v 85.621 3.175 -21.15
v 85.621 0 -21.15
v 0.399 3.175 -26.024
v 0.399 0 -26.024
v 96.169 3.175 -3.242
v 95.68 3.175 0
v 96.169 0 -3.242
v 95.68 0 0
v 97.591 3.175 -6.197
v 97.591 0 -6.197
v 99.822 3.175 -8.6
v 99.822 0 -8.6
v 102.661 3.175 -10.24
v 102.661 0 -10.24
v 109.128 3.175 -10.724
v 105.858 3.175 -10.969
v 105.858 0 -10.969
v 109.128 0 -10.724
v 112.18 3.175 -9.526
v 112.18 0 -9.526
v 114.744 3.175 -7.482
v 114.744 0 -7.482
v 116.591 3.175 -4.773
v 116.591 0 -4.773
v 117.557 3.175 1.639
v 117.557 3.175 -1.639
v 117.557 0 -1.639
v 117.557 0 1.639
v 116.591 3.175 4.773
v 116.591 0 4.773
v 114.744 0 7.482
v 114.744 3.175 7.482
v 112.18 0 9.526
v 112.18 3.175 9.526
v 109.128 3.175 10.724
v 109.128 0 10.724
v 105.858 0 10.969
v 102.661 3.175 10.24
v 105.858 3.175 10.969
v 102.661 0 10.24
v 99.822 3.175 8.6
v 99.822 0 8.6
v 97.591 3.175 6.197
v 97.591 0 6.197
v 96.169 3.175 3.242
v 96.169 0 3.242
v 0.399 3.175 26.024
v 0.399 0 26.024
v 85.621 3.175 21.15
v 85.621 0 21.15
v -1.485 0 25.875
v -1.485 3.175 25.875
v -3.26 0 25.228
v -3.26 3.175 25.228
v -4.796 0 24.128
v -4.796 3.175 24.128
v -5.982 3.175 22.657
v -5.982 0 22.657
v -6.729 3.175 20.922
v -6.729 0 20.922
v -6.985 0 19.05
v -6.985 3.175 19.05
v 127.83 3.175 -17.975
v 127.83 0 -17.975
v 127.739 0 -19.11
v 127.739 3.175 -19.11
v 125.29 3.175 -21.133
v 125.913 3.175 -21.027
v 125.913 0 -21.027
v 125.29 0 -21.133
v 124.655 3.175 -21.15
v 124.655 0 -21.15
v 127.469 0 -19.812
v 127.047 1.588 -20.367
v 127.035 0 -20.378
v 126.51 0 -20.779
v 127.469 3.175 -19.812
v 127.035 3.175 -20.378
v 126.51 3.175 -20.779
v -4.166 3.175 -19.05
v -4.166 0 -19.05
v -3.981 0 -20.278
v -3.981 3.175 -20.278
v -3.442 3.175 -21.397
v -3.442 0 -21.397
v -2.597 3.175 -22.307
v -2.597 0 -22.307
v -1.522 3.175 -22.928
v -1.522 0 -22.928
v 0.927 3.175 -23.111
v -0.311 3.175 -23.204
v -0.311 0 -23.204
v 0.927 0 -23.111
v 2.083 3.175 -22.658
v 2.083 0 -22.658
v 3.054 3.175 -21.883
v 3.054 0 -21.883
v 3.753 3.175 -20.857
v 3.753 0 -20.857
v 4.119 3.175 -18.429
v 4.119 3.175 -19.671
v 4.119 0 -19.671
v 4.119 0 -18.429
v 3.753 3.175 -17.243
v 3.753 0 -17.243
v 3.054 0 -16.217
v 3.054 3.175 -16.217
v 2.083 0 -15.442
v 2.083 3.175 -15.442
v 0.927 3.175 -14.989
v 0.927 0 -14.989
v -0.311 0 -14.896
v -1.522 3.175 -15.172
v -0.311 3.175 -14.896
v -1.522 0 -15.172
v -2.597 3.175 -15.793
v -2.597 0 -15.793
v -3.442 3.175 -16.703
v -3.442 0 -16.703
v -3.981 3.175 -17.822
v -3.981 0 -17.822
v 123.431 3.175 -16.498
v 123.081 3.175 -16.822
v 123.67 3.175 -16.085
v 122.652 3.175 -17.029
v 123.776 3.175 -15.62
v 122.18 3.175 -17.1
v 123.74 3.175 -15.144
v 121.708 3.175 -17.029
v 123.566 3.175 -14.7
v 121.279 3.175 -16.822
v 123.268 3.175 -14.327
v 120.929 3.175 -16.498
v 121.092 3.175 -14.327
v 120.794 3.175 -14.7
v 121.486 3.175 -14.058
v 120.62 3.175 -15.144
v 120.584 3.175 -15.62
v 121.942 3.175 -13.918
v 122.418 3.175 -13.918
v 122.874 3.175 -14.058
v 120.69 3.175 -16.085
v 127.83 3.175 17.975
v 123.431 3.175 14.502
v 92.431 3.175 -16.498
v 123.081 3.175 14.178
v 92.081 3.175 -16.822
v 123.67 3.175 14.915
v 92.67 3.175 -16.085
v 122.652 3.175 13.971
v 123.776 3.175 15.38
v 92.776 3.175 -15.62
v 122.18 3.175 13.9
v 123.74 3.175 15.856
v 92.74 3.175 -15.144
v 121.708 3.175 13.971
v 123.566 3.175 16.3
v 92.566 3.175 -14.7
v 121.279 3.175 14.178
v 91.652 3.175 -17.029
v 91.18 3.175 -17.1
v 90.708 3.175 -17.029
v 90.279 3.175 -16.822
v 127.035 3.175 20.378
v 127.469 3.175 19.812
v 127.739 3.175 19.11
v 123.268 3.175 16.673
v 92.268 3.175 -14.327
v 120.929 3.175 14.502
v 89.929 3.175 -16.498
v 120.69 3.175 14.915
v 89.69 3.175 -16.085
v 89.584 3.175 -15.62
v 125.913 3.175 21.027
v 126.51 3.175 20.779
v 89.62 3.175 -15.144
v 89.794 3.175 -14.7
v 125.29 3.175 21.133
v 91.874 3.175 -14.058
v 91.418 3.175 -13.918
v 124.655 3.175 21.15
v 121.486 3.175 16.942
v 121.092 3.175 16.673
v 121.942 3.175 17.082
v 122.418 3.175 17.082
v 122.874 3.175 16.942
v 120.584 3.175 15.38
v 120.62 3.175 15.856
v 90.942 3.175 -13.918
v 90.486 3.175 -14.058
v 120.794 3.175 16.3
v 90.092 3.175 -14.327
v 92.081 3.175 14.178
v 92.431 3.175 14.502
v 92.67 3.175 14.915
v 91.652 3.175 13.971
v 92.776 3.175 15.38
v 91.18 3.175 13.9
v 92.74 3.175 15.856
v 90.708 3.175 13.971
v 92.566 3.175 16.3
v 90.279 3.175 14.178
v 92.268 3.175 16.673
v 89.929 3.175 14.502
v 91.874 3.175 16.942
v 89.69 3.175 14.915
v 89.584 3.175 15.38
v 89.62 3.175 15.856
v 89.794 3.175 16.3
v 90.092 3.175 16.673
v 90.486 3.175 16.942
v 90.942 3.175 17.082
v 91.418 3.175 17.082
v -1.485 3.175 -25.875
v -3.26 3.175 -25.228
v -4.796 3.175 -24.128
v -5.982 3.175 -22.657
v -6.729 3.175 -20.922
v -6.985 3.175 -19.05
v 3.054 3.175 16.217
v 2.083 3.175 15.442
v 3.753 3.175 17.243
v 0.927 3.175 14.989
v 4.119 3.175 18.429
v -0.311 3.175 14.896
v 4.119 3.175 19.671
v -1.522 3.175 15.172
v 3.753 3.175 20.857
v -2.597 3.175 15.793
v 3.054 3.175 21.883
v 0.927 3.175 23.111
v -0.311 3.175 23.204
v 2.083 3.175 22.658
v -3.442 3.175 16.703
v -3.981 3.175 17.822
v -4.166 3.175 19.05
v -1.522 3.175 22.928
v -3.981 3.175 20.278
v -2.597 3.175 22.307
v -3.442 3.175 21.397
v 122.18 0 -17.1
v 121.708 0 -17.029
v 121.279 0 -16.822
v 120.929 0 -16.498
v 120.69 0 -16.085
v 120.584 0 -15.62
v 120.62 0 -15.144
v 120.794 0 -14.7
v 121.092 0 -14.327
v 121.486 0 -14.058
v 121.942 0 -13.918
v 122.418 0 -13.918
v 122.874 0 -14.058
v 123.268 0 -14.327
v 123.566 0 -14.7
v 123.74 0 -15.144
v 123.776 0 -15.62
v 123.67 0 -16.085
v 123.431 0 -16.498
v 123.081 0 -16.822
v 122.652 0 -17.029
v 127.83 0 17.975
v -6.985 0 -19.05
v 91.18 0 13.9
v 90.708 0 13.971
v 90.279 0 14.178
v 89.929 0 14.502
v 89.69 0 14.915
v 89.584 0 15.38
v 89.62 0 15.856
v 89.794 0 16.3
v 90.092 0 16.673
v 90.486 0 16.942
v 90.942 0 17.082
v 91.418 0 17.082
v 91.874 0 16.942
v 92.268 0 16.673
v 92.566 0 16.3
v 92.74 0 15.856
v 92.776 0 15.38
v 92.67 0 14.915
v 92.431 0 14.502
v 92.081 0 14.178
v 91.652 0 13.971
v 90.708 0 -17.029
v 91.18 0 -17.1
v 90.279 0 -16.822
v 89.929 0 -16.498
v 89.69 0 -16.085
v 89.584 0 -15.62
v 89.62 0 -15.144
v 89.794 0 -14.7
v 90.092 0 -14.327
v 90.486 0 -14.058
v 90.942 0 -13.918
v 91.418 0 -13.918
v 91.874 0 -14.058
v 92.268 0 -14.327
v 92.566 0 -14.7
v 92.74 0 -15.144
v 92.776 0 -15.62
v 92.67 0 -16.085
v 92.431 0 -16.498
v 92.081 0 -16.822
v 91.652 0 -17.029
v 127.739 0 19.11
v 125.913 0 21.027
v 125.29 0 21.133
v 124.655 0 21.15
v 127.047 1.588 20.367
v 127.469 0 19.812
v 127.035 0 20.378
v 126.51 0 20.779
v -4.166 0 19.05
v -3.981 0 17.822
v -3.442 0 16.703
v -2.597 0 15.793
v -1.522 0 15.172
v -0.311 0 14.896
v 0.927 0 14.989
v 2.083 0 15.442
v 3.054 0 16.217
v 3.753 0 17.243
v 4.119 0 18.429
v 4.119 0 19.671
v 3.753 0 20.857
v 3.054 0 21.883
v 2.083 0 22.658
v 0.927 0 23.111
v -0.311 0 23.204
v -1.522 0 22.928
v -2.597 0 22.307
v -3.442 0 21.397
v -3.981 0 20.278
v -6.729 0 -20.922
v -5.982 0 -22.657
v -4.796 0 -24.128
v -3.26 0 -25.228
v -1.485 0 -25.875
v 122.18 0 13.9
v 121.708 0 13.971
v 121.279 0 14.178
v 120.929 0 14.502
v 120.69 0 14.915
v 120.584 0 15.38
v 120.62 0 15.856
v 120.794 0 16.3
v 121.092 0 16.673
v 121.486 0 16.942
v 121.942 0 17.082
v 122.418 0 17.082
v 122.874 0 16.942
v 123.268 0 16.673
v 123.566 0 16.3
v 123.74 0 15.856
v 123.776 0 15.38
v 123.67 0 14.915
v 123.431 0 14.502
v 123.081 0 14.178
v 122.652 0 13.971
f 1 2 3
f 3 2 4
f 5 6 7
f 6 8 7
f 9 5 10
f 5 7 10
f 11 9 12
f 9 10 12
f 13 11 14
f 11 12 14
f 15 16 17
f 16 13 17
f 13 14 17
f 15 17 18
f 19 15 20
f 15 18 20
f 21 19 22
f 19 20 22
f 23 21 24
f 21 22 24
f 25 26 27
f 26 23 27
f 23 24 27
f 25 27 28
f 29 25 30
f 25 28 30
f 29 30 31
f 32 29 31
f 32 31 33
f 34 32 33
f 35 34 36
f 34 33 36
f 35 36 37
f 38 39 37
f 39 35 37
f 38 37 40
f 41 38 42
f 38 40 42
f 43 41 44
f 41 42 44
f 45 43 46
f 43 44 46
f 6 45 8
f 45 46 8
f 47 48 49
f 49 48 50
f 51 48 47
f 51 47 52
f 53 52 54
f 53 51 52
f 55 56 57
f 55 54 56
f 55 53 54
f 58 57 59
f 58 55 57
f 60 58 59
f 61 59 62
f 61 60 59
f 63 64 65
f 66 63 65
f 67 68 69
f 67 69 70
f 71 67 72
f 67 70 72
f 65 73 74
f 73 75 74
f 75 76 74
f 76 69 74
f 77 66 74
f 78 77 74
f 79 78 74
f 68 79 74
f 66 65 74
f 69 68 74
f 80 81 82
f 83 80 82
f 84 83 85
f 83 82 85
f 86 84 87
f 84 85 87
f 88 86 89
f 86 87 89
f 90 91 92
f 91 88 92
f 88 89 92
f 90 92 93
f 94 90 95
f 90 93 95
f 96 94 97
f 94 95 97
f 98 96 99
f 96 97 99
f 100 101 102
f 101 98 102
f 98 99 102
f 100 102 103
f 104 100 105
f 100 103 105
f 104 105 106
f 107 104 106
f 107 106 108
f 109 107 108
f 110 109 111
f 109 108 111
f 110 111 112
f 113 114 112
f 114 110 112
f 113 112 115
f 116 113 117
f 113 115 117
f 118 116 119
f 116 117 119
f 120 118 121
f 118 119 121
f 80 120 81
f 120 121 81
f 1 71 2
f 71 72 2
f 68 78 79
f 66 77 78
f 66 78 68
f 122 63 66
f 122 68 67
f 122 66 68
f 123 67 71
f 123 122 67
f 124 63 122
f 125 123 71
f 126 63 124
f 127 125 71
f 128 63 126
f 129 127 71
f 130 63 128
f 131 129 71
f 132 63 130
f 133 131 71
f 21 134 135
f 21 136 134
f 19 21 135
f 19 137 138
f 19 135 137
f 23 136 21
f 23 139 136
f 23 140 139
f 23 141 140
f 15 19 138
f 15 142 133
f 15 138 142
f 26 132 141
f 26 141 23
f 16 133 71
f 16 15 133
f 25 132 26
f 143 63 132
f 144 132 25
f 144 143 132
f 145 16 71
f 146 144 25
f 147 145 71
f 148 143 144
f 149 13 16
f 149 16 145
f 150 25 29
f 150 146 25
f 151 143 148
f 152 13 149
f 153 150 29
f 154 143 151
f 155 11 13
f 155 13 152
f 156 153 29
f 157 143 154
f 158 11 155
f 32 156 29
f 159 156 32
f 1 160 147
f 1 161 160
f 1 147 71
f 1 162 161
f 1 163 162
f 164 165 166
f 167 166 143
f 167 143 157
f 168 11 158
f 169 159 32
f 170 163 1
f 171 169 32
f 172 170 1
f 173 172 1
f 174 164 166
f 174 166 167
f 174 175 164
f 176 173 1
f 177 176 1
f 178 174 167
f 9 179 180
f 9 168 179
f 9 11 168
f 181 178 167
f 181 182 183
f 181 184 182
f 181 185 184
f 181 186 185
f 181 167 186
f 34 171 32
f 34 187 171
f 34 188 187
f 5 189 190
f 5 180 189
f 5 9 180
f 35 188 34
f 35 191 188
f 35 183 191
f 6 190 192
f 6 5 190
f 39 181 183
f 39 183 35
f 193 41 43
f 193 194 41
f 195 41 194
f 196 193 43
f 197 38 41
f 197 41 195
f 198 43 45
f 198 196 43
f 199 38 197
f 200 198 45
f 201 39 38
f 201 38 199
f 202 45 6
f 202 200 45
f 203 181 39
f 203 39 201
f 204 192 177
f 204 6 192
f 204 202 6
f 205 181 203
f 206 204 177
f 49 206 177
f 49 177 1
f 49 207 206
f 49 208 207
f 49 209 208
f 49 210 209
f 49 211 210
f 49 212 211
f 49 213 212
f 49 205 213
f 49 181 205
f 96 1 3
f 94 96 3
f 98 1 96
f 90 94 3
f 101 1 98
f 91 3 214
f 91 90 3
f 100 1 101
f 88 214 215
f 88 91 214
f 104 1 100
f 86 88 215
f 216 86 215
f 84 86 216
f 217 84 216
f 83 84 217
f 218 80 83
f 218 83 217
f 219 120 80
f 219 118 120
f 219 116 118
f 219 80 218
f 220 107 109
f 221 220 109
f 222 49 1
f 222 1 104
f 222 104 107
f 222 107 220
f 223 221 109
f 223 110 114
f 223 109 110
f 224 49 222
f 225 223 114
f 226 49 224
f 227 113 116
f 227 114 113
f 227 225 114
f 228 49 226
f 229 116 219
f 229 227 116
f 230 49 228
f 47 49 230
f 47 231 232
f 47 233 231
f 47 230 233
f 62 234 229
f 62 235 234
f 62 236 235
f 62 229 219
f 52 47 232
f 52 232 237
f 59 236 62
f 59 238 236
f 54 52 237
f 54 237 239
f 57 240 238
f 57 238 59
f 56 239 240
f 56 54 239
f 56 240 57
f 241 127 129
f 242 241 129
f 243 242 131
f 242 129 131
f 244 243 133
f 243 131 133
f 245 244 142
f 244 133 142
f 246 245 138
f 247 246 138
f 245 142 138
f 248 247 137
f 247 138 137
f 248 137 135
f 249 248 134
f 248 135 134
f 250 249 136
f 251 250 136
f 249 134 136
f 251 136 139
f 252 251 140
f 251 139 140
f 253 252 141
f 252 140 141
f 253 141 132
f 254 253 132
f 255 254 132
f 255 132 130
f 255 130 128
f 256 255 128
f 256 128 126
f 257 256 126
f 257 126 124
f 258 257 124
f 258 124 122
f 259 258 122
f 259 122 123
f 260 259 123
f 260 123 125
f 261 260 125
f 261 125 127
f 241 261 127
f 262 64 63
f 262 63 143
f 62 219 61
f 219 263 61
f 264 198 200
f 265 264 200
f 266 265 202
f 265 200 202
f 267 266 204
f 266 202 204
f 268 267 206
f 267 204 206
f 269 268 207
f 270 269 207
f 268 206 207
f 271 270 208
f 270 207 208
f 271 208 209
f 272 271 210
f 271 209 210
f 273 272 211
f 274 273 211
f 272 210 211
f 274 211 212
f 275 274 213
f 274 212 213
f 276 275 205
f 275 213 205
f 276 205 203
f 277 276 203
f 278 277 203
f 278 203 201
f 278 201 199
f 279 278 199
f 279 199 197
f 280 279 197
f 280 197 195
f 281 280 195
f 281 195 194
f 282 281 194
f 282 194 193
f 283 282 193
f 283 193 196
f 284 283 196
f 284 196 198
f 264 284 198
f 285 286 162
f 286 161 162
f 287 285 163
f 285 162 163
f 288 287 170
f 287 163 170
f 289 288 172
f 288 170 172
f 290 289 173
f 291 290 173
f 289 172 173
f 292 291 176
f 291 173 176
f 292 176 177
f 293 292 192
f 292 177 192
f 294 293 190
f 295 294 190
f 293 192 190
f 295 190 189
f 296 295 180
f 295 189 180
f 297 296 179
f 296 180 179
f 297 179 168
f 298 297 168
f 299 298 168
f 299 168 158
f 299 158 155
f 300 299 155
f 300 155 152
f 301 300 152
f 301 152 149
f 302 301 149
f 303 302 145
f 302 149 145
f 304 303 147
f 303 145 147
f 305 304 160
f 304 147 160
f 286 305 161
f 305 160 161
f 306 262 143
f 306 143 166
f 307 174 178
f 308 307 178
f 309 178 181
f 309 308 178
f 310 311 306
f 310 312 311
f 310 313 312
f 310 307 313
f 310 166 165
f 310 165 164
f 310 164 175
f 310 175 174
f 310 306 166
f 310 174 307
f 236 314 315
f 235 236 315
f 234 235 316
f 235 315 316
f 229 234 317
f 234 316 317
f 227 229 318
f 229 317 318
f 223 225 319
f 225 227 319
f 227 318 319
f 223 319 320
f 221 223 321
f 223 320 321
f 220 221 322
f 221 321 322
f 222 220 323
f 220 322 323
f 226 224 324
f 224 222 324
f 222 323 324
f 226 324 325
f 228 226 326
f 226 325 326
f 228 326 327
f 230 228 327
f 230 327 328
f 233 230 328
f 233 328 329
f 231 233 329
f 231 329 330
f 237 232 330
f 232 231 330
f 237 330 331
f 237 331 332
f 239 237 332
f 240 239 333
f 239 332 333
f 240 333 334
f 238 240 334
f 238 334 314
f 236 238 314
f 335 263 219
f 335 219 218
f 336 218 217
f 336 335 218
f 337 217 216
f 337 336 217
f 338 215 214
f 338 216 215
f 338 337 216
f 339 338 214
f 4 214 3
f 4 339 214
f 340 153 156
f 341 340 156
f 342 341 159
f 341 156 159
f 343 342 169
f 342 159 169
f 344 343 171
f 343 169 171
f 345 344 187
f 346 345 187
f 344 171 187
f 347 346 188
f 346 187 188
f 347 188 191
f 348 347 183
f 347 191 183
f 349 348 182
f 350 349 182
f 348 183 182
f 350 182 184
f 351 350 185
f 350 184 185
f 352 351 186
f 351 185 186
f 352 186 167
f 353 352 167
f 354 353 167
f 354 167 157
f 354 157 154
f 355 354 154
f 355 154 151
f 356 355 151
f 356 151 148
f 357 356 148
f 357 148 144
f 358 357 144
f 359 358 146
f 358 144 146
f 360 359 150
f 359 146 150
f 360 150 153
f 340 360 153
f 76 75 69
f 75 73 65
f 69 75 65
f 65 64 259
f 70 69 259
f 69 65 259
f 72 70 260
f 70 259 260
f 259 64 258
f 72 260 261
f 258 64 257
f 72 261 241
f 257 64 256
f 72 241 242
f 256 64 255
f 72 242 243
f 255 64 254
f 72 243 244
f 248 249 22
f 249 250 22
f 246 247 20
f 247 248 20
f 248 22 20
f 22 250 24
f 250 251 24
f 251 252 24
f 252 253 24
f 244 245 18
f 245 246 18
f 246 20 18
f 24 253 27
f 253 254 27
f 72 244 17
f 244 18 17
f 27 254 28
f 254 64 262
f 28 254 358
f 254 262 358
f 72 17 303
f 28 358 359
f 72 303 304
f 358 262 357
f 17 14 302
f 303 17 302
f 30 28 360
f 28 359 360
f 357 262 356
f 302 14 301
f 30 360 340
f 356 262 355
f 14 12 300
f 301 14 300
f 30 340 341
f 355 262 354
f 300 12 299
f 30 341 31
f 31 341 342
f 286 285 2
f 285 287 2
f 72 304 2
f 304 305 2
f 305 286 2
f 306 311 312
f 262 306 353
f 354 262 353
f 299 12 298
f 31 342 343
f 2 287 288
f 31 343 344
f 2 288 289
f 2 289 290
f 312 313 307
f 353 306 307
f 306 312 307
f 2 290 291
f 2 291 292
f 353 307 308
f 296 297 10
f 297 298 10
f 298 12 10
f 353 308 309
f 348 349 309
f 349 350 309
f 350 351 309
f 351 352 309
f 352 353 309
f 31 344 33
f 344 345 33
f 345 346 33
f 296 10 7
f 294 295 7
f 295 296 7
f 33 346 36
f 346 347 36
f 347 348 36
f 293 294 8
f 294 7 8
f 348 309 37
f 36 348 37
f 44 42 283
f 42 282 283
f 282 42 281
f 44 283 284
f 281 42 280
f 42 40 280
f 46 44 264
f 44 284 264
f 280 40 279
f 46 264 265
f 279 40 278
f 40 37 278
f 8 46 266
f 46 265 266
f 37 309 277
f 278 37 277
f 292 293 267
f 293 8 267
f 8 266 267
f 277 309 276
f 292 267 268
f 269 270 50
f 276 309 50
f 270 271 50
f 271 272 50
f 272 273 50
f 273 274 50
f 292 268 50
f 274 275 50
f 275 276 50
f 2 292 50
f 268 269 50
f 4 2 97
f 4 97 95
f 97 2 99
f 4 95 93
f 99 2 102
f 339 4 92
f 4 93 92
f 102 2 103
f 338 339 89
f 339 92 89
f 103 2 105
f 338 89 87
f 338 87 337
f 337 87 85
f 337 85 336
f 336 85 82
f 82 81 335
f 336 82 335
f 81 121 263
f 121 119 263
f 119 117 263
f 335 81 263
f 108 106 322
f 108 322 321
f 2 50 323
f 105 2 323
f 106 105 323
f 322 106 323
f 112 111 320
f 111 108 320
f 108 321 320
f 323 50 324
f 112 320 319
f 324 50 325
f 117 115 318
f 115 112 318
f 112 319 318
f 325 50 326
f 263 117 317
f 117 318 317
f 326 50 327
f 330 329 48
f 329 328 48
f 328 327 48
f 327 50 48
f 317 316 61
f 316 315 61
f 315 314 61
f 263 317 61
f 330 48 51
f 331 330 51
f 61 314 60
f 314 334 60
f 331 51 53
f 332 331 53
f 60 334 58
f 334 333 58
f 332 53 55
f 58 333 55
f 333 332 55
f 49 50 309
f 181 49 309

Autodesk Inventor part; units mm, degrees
ref_plane "YZ Plane" through (0, 0, 0) normal (1, 0, 0) x (0, 1, 0)
ref_plane "XZ Plane" through (0, 0, 0) normal (0, 1, 0) x (-1, 0, 0)
ref_plane "XY Plane" through (0, 0, 0) normal (0, 0, 1) x (1, 0, 0)
sketch "Sketch1" plane through (0, 0, 0) normal (0, 1, 0) x (-1, 0, 0)
  circle A0 centre (-106.68, 0) radius 11
  circle A1 centre (0, 19.05) radius 4.1656
  circle A2 centre (0, -19.05) radius 4.1656
  arc A3 (6.985, 19.05) -> (-0.3988, 26.0236) centre (0, 19.05) ccw
  arc A4 (-0.3988, -26.0236) -> (6.985, -19.05) centre (0, -19.05) ccw
  line L0 (-85.6208, 21.15) -> (-124.655, 21.15)
  line L1 (-124.655, -21.15) -> (-85.6208, -21.15)
  line L2 (-127.83, -17.975) -> (-127.83, 17.975)
  line L3 (6.985, -19.05) -> (6.985, 19.05)
  spline S0 degree 4 poles (-127.83, 17.975) (-127.83, 18.6185) (-127.83, 19.9054) (-126.5854, 21.15) (-125.2985, 21.15) (-124.655, 21.15) knots 0 0 0 0 0 0.5 1 1 1 1 1
  spline S1 degree 4 poles (-127.83, -17.975) (-127.83, -18.6185) (-127.83, -19.9054) (-126.5854, -21.15) (-125.2985, -21.15) (-124.655, -21.15) knots 0 0 0 0 0 0.5 1 1 1 1 1
  line L4 (-85.6208, 21.15) -> (-85.6208, -21.15) construction
  line L5 (-0.3988, 26.0236) -> (-85.6208, 21.15)
  line L6 (-85.6208, -21.15) -> (-0.3988, -26.0236)
  point P0 (0, 0)
  point P1 (-122.18, 15.5)
  point P2 (-91.18, 15.5)
  point P3 (-91.18, -15.5)
  point P4 (-122.18, -15.5)
  dimension "d0" = 106.68
  dimension "d1" = 19.05
  dimension "d2" = 19.05
  dimension "d5" = 22
  dimension "d8" = 8.3312
  dimension "d9" = 8.3312
  dimension "d10" = 13.97
  dimension "d11" = 13.97
  dimension "d52" = 134.815
  dimension "d53" = 42.3
  dimension "d54" = 6.985
  dimension "d55" = 21.15
  dimension "d57" = 98.165
  dimension "d59" = 98.165
  dimension "d61" = 113.665
  dimension "d62" = 129.165
  dimension "d64" = 129.165
  dimension "d66" = 131.64
  dimension "d67" = 131.64
  dimension "d70" = 3.175
  dimension "d71" = 3.175
  dimension "d72" = 5.65
  dimension "d73" = 5.65
  dimension "d74" = 5.65
  dimension "d75" = 5.65
  dimension "d76" = 93.273
  dimension "d77" = 42.3
extrude "Extrusion1" add sketch "Sketch1" along normal blind 3.175
hole "Hole1" at (106.68, 0, 0) at (0, 0, 19.05) at (0, 0, -19.05) at (122.18, 0, 15.5) at (91.18, 0, 15.5) at (91.18, 0, -15.5) at (122.18, 0, -15.5) direction (0, 1, 0) diameter 3.2004 end through all clearance for "Flat Head Machine Screw" size "M3" standard "Ansi Metric M Profile"
equation "\"d2\" = d1"
equation "\"d9\" = d8"
properties part number "x_motor_mount"
